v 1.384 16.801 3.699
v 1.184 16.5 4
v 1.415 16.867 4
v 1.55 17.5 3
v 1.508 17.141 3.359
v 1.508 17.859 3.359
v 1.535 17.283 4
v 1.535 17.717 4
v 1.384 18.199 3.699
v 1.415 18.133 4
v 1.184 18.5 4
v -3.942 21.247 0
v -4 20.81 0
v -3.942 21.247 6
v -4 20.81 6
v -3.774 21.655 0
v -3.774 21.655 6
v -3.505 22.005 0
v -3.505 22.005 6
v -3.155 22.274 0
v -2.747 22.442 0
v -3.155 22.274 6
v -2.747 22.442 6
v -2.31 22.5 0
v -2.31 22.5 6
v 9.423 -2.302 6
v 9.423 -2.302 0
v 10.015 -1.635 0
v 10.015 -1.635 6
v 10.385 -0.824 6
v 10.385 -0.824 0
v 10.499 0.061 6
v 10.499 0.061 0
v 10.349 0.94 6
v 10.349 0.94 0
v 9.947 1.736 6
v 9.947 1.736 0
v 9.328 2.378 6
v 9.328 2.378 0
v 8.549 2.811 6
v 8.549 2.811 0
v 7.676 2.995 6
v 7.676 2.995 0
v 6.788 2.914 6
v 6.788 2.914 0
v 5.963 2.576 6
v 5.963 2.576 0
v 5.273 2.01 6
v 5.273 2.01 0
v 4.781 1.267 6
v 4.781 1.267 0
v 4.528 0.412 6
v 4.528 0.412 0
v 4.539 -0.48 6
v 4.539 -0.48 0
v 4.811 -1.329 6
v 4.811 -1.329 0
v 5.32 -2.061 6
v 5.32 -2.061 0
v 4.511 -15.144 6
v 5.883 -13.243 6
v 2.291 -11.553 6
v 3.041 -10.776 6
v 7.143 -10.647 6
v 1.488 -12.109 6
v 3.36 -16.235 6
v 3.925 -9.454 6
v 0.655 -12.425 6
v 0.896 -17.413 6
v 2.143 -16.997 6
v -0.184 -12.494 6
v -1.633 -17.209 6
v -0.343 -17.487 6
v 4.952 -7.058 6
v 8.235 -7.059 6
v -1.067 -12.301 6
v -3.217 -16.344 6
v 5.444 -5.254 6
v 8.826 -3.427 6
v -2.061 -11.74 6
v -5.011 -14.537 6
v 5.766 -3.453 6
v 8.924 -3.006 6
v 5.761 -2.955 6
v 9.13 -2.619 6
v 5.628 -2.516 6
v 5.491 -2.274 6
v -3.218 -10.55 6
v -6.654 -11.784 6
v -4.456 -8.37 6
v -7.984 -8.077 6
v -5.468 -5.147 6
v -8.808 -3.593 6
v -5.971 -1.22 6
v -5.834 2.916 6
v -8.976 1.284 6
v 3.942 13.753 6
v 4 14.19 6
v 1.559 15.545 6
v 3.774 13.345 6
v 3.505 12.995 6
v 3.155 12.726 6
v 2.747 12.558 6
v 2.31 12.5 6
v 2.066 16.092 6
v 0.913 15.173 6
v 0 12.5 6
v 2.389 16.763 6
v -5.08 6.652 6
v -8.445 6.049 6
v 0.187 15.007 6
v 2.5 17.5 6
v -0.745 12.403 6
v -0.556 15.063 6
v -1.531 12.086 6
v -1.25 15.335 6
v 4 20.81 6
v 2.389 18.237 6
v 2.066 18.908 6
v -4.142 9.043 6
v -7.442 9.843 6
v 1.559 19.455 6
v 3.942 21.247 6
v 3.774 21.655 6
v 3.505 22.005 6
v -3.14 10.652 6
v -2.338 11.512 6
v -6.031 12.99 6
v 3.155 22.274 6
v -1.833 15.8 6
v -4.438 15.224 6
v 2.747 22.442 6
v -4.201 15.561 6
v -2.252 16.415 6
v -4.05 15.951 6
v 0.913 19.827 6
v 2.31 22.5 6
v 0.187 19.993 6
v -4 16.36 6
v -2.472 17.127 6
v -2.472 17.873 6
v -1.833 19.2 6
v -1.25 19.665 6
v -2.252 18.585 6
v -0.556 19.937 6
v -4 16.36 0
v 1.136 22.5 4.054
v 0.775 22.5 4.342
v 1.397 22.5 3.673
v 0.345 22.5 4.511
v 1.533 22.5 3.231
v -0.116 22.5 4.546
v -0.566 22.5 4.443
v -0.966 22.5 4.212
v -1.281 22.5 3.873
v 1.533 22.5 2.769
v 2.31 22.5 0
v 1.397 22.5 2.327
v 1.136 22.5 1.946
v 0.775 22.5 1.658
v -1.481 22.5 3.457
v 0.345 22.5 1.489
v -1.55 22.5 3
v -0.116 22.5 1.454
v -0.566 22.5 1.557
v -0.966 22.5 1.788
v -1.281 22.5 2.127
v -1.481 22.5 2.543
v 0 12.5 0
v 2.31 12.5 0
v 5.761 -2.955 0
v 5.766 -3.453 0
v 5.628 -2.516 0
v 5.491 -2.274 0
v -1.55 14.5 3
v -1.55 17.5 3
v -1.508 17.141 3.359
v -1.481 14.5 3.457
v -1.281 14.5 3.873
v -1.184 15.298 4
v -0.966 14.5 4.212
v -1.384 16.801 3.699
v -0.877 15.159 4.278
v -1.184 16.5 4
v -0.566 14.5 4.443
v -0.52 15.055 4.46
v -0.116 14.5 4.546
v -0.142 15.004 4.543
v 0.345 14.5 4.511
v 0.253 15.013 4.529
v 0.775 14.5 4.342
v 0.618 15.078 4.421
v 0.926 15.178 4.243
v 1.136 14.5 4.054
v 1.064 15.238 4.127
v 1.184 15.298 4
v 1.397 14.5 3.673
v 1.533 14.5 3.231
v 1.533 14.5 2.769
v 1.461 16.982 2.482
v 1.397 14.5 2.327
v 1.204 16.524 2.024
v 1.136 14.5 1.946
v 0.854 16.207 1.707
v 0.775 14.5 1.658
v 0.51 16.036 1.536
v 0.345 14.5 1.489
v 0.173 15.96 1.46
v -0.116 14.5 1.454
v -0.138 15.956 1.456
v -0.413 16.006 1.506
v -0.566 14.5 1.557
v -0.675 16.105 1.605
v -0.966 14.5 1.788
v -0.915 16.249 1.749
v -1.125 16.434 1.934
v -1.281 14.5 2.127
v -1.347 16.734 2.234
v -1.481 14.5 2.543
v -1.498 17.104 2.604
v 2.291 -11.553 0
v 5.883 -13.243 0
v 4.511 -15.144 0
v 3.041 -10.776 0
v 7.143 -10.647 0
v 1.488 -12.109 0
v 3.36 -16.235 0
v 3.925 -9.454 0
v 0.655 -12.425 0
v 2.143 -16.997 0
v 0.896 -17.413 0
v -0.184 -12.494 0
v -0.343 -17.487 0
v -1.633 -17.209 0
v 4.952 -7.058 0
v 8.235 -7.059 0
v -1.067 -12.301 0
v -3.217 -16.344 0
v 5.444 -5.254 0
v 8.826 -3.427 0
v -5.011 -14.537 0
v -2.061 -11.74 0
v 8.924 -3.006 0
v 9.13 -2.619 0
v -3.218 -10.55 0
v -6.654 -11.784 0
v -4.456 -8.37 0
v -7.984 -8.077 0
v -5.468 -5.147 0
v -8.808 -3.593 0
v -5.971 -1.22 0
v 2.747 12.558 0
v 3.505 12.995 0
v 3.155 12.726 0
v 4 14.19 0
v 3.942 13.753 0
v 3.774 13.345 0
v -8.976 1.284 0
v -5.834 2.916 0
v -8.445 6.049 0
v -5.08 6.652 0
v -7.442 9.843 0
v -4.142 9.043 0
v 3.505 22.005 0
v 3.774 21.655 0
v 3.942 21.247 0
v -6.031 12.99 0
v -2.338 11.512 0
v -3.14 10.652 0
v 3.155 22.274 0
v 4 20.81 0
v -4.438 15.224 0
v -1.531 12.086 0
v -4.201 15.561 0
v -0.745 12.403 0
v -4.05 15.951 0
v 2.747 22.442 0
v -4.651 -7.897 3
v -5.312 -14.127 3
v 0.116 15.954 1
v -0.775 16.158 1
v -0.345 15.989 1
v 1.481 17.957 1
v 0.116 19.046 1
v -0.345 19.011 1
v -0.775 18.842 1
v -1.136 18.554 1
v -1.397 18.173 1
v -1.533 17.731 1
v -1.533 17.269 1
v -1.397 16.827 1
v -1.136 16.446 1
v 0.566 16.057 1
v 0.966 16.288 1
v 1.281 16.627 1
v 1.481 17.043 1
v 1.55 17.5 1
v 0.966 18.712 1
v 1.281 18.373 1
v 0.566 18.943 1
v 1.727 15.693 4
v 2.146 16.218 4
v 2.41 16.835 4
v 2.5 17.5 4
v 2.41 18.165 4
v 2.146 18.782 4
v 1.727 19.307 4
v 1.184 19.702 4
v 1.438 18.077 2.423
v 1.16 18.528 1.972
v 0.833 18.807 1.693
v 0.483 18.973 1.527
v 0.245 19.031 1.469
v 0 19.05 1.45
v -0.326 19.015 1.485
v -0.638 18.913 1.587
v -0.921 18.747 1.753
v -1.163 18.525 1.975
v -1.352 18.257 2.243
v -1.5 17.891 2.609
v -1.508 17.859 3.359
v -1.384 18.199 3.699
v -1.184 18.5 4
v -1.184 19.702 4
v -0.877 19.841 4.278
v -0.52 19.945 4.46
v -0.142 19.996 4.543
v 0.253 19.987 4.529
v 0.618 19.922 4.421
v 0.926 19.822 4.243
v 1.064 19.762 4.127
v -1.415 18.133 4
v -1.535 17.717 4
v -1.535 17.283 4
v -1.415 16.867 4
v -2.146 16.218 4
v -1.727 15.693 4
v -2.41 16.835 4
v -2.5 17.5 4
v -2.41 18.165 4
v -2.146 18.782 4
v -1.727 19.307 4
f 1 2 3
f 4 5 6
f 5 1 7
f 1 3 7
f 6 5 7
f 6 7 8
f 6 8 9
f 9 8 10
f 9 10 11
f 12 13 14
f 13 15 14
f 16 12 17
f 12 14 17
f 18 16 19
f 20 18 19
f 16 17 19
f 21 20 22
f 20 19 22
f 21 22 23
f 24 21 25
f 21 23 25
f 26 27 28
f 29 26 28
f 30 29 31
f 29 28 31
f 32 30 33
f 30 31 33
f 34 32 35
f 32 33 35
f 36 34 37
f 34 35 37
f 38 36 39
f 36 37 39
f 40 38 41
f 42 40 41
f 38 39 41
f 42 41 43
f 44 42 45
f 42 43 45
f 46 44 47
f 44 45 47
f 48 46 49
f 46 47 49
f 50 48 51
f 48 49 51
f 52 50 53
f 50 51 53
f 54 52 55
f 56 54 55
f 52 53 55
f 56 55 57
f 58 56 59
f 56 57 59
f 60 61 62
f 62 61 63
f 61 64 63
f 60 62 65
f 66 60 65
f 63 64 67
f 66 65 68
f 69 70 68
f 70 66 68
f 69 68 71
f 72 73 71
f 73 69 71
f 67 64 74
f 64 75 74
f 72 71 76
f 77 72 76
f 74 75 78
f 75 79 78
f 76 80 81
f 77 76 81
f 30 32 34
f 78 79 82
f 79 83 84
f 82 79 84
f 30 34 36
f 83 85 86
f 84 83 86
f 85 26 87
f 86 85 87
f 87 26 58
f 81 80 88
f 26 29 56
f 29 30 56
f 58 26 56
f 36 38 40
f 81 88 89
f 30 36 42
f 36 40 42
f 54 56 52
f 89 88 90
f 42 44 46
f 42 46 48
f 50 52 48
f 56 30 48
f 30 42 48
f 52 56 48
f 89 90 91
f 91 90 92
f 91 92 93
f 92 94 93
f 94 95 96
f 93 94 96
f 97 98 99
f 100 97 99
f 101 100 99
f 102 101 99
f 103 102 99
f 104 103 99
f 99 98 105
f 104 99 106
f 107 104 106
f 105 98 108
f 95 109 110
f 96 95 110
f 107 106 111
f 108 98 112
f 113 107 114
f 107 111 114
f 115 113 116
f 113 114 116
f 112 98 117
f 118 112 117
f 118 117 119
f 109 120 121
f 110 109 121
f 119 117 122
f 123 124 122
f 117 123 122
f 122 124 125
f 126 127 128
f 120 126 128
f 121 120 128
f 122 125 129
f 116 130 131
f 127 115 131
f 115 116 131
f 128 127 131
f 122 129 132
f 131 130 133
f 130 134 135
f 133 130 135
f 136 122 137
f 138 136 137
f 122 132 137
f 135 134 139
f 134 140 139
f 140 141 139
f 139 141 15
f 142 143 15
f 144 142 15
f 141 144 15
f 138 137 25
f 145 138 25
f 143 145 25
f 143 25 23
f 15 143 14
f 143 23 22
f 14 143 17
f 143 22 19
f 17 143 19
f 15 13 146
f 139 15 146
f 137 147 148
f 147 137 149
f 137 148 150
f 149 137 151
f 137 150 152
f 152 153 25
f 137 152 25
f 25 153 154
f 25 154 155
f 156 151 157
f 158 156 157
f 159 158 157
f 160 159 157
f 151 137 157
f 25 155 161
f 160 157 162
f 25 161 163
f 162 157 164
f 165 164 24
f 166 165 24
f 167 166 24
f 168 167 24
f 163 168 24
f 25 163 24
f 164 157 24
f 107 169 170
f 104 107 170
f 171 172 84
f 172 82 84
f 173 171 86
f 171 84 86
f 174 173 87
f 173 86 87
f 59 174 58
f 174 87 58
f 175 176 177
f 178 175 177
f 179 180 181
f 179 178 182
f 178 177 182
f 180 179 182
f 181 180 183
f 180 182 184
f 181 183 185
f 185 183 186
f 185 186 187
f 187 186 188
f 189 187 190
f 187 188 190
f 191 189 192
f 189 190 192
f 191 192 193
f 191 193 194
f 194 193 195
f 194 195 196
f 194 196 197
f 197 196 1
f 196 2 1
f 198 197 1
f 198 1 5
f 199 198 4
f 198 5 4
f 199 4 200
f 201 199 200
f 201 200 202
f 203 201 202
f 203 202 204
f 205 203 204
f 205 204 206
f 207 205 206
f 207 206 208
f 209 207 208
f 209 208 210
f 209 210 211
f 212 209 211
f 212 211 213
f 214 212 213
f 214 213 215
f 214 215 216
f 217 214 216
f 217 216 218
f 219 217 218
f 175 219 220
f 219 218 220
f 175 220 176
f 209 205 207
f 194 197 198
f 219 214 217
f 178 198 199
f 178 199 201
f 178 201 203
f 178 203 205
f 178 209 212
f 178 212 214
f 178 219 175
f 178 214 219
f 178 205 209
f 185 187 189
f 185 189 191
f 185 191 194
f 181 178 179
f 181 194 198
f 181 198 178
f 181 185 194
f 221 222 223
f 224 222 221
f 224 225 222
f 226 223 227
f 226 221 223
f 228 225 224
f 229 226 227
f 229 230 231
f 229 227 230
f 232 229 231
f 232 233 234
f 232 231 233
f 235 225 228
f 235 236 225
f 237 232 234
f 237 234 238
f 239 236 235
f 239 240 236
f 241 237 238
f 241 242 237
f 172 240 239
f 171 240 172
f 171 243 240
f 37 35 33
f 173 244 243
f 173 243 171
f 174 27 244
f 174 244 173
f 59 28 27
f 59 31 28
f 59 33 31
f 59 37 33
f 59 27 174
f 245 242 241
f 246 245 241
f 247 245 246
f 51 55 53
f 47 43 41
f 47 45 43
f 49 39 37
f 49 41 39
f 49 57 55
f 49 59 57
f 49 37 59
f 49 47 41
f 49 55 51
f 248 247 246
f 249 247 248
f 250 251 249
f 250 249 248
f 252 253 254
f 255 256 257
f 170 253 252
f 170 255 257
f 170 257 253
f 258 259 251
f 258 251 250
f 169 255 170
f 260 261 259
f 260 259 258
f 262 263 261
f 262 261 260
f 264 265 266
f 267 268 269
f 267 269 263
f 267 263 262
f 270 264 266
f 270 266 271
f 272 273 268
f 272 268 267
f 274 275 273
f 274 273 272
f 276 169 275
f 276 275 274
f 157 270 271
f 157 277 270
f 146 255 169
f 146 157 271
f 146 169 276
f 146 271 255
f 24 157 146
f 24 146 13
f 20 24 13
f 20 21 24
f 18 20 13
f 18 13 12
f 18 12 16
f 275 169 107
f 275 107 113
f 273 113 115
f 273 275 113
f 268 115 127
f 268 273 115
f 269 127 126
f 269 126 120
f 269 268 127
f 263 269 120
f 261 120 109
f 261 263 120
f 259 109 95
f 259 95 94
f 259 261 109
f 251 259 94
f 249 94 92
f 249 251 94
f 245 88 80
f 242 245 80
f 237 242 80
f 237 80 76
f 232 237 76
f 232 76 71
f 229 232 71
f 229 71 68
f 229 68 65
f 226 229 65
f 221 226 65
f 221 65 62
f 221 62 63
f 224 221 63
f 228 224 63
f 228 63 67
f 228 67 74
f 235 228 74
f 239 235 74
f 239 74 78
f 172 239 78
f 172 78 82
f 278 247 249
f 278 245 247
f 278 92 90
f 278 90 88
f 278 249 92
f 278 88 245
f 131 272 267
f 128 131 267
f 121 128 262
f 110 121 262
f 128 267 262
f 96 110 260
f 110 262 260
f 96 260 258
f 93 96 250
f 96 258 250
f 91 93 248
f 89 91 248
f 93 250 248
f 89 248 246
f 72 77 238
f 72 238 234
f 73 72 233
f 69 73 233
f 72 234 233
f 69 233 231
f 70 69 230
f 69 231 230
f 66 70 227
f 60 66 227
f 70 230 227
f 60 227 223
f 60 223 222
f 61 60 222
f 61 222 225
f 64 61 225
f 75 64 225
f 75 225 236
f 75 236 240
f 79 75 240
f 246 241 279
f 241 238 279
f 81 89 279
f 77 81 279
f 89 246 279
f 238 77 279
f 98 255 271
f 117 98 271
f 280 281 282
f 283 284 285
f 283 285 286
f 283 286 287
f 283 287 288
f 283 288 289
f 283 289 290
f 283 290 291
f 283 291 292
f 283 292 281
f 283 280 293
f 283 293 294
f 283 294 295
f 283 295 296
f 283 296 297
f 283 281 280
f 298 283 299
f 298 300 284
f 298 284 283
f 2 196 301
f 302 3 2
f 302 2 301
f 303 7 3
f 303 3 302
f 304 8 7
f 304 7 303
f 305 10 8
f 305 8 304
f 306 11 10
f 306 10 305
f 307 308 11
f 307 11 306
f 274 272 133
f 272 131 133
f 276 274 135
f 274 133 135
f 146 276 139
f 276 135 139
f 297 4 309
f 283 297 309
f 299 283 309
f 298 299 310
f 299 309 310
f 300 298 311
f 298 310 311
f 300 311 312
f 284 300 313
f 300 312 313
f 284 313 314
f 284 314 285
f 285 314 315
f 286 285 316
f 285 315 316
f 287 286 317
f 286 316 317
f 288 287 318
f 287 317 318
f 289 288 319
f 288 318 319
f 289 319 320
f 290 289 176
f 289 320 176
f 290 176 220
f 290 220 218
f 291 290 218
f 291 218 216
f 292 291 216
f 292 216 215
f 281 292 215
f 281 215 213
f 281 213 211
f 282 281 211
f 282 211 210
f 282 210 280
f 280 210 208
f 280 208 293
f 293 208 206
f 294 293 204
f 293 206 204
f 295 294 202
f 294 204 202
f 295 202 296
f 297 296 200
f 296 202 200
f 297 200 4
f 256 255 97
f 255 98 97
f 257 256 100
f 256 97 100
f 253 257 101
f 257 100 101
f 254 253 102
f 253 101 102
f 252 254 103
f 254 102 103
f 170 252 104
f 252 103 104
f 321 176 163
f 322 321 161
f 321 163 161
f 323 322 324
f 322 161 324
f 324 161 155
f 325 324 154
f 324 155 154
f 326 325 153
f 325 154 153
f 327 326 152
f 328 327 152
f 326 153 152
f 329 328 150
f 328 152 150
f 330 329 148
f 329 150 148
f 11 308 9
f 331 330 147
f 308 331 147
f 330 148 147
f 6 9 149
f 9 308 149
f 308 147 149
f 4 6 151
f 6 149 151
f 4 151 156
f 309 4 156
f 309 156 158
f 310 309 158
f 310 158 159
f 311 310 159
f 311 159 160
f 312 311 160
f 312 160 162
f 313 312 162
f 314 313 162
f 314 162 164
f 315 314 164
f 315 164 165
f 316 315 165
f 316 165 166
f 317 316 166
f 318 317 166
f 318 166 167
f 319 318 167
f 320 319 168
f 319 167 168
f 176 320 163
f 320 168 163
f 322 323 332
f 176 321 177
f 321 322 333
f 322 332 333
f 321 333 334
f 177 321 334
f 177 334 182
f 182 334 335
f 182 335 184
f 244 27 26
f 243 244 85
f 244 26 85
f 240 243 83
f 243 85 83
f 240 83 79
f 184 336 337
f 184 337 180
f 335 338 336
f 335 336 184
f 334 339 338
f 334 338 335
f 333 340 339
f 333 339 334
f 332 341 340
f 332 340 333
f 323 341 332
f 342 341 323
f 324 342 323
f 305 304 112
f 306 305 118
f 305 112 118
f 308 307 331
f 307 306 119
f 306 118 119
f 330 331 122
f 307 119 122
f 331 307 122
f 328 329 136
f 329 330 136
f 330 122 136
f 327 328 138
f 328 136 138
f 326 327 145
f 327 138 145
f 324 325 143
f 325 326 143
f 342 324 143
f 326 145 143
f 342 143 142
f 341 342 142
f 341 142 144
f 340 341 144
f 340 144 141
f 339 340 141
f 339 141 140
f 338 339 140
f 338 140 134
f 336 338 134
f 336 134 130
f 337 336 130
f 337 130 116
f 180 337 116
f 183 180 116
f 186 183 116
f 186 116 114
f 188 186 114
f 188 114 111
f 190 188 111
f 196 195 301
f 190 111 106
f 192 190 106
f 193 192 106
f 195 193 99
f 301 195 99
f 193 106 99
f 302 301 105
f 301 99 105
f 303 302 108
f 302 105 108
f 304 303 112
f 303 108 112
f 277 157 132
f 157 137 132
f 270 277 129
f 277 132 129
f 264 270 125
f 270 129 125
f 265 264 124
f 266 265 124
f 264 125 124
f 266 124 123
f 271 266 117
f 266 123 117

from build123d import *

# Parameters (mm, degrees)
F1_DEPTH = 6
F2_R     = 1.6899494937
F3_R     = 1.55
F4_DEPTH = 8
F5_R     = 1.55
F6_DEPTH = 5
F5_R_2   = 2.5
F7_DEPTH = 2


with BuildPart() as f1:
    # F0 (on Top) → F1 (new body)
    with BuildSketch(Plane.XY):
        with BuildLine():
            add(Edge.make_bspline(
                [(0, 12.5), (-12.6297845017, 12.5), (-4.6511058744, -7.8966891975), (3.3275727529, -28.2933783949), (5.8765340024, -2.522767955)],
                knots=[0, 0, 0, 2.254585855, 2.254585855, 4.5091717099, 4.5091717099, 4.5091717099], degree=2, weights=[1, 0.429106551, 1, 0.429106551, 1]))
            Line((0, 12.5), (4, 12.5))
            Line((4, 12.5), (4, 22.5))
            Line((4, 22.5), (-4, 22.5))
            Line((-4, 22.5), (-4, 15.6766122884))
            add(Edge.make_bspline(
                [(-4, 15.6766122884), (-17.2710632683, 2.8738237646), (-5.3116613856, -14.1271955928), (6.6477404971, -31.1282149502), (8.8957782131, -2.6555231462)],
                knots=[3.6021466453, 3.6021466453, 3.6021466453, 5.6518978151, 5.6518978151, 7.7016489849, 7.7016489849, 7.7016489849], degree=2, weights=[1, 0.5192052222, 1, 0.5192052222, 1]))
            ThreePointArc((8.8957782131, -2.6555231462), (7.6317817021, 2.9971041996), (5.8765340024, -2.522767955))
        make_face()
    extrude(amount=F1_DEPTH)

    # F2
    f2_edges = [f1.edges().sort_by_distance(p)[0] for p in [
        (8.895778, -2.655523, 3),
        (4, 12.5, 3),
        (5.876534, -2.522768, 3),
        (-4, 15.676612, 3),
        (4, 22.5, 3),
        (-4, 22.5, 3),
    ]]
    fillet(f2_edges, radius=F2_R)

    # F3 (on face) → F4 (cut)
    with BuildSketch(Plane(origin=(0, 22.5, 0), x_dir=(-1, 0, 0), z_dir=(0, 1, 0))):
        with Locations((0, 3)):
            Circle(F3_R)
    extrude(amount=-F4_DEPTH, mode=Mode.SUBTRACT)

    # F5 (on face) → F6 (cut)
    with BuildSketch(Plane.XY.offset(6)):
        with Locations((0, 17.5)):
            Circle(F5_R)
    extrude(amount=-F6_DEPTH, mode=Mode.SUBTRACT)

    # F5 (on face) → F7 (cut)
    with BuildSketch(Plane.XY.offset(6)):
        with Locations((0, 17.5)):
            Circle(F5_R_2)
        with Locations((0, 17.5)):
            Circle(F5_R, mode=Mode.SUBTRACT)
    extrude(amount=-F7_DEPTH, mode=Mode.SUBTRACT)


solid = f1.part
